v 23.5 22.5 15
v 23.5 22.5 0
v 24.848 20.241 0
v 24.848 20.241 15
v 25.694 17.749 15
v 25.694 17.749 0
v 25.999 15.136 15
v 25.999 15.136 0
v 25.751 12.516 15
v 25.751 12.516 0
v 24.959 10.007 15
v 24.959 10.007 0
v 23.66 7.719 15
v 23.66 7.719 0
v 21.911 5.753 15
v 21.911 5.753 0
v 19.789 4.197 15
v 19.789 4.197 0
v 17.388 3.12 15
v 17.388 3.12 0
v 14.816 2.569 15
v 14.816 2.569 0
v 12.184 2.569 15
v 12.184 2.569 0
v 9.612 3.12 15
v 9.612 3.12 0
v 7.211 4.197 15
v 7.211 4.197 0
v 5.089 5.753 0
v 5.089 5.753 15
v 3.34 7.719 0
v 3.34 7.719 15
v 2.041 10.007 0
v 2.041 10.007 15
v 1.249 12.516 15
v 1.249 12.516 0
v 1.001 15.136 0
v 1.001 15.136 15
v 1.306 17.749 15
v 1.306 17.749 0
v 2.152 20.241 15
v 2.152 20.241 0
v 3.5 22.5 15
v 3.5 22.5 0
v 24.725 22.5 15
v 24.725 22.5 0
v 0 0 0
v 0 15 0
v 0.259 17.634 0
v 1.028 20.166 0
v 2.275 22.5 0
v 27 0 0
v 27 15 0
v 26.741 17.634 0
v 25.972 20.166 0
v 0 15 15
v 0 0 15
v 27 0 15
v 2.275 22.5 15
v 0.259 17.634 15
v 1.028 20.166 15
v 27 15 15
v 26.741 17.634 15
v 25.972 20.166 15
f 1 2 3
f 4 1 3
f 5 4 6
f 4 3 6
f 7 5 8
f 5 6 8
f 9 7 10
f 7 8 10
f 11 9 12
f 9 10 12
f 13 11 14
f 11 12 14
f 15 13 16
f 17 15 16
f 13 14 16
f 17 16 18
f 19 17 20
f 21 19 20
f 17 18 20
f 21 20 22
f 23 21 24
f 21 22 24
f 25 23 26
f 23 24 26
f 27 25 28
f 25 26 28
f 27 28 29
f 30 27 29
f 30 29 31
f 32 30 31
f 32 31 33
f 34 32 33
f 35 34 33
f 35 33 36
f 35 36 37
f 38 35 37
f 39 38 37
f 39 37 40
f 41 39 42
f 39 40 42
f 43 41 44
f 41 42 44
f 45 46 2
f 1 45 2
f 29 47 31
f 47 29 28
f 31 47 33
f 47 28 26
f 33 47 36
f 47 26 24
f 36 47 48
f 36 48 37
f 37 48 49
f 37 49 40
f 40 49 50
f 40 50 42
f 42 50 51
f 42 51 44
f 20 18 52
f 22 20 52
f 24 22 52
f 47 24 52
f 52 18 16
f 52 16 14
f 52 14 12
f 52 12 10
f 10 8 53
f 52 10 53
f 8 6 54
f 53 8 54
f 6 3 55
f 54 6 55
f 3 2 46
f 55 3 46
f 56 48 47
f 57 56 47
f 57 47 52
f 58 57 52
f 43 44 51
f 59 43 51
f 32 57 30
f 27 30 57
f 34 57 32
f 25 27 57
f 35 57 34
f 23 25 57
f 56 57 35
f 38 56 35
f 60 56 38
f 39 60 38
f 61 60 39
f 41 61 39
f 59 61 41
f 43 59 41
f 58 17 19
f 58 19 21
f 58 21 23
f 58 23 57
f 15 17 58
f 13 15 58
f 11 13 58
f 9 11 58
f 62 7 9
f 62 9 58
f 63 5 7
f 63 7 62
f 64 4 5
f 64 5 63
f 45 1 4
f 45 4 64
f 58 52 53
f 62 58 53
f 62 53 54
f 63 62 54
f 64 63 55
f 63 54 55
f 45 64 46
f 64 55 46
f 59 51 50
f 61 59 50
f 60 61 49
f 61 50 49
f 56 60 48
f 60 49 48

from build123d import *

# Parameters (mm, degrees)
F1_DEPTH = 15


with BuildPart() as f1:
    # F0 (on Top) → F1 (new body)
    with BuildSketch(Plane.XY):
        with BuildLine():
            ThreePointArc((23.5, 22.5), (13.5, 2.5), (3.5, 22.5))
            Line((3.5, 22.5), (2.275028, 22.5))
            ThreePointArc((2.275028, 22.5), (0.581271, 18.918729), (0, 15))
            Line((0, 15), (0, 0))
            Line((0, 0), (27, 0))
            Line((27, 0), (27, 15))
            ThreePointArc((27, 15), (26.418729, 18.918729), (24.724972, 22.5))
            Line((24.724972, 22.5), (23.5, 22.5))
        make_face()
    extrude(amount=F1_DEPTH)


solid = f1.part
